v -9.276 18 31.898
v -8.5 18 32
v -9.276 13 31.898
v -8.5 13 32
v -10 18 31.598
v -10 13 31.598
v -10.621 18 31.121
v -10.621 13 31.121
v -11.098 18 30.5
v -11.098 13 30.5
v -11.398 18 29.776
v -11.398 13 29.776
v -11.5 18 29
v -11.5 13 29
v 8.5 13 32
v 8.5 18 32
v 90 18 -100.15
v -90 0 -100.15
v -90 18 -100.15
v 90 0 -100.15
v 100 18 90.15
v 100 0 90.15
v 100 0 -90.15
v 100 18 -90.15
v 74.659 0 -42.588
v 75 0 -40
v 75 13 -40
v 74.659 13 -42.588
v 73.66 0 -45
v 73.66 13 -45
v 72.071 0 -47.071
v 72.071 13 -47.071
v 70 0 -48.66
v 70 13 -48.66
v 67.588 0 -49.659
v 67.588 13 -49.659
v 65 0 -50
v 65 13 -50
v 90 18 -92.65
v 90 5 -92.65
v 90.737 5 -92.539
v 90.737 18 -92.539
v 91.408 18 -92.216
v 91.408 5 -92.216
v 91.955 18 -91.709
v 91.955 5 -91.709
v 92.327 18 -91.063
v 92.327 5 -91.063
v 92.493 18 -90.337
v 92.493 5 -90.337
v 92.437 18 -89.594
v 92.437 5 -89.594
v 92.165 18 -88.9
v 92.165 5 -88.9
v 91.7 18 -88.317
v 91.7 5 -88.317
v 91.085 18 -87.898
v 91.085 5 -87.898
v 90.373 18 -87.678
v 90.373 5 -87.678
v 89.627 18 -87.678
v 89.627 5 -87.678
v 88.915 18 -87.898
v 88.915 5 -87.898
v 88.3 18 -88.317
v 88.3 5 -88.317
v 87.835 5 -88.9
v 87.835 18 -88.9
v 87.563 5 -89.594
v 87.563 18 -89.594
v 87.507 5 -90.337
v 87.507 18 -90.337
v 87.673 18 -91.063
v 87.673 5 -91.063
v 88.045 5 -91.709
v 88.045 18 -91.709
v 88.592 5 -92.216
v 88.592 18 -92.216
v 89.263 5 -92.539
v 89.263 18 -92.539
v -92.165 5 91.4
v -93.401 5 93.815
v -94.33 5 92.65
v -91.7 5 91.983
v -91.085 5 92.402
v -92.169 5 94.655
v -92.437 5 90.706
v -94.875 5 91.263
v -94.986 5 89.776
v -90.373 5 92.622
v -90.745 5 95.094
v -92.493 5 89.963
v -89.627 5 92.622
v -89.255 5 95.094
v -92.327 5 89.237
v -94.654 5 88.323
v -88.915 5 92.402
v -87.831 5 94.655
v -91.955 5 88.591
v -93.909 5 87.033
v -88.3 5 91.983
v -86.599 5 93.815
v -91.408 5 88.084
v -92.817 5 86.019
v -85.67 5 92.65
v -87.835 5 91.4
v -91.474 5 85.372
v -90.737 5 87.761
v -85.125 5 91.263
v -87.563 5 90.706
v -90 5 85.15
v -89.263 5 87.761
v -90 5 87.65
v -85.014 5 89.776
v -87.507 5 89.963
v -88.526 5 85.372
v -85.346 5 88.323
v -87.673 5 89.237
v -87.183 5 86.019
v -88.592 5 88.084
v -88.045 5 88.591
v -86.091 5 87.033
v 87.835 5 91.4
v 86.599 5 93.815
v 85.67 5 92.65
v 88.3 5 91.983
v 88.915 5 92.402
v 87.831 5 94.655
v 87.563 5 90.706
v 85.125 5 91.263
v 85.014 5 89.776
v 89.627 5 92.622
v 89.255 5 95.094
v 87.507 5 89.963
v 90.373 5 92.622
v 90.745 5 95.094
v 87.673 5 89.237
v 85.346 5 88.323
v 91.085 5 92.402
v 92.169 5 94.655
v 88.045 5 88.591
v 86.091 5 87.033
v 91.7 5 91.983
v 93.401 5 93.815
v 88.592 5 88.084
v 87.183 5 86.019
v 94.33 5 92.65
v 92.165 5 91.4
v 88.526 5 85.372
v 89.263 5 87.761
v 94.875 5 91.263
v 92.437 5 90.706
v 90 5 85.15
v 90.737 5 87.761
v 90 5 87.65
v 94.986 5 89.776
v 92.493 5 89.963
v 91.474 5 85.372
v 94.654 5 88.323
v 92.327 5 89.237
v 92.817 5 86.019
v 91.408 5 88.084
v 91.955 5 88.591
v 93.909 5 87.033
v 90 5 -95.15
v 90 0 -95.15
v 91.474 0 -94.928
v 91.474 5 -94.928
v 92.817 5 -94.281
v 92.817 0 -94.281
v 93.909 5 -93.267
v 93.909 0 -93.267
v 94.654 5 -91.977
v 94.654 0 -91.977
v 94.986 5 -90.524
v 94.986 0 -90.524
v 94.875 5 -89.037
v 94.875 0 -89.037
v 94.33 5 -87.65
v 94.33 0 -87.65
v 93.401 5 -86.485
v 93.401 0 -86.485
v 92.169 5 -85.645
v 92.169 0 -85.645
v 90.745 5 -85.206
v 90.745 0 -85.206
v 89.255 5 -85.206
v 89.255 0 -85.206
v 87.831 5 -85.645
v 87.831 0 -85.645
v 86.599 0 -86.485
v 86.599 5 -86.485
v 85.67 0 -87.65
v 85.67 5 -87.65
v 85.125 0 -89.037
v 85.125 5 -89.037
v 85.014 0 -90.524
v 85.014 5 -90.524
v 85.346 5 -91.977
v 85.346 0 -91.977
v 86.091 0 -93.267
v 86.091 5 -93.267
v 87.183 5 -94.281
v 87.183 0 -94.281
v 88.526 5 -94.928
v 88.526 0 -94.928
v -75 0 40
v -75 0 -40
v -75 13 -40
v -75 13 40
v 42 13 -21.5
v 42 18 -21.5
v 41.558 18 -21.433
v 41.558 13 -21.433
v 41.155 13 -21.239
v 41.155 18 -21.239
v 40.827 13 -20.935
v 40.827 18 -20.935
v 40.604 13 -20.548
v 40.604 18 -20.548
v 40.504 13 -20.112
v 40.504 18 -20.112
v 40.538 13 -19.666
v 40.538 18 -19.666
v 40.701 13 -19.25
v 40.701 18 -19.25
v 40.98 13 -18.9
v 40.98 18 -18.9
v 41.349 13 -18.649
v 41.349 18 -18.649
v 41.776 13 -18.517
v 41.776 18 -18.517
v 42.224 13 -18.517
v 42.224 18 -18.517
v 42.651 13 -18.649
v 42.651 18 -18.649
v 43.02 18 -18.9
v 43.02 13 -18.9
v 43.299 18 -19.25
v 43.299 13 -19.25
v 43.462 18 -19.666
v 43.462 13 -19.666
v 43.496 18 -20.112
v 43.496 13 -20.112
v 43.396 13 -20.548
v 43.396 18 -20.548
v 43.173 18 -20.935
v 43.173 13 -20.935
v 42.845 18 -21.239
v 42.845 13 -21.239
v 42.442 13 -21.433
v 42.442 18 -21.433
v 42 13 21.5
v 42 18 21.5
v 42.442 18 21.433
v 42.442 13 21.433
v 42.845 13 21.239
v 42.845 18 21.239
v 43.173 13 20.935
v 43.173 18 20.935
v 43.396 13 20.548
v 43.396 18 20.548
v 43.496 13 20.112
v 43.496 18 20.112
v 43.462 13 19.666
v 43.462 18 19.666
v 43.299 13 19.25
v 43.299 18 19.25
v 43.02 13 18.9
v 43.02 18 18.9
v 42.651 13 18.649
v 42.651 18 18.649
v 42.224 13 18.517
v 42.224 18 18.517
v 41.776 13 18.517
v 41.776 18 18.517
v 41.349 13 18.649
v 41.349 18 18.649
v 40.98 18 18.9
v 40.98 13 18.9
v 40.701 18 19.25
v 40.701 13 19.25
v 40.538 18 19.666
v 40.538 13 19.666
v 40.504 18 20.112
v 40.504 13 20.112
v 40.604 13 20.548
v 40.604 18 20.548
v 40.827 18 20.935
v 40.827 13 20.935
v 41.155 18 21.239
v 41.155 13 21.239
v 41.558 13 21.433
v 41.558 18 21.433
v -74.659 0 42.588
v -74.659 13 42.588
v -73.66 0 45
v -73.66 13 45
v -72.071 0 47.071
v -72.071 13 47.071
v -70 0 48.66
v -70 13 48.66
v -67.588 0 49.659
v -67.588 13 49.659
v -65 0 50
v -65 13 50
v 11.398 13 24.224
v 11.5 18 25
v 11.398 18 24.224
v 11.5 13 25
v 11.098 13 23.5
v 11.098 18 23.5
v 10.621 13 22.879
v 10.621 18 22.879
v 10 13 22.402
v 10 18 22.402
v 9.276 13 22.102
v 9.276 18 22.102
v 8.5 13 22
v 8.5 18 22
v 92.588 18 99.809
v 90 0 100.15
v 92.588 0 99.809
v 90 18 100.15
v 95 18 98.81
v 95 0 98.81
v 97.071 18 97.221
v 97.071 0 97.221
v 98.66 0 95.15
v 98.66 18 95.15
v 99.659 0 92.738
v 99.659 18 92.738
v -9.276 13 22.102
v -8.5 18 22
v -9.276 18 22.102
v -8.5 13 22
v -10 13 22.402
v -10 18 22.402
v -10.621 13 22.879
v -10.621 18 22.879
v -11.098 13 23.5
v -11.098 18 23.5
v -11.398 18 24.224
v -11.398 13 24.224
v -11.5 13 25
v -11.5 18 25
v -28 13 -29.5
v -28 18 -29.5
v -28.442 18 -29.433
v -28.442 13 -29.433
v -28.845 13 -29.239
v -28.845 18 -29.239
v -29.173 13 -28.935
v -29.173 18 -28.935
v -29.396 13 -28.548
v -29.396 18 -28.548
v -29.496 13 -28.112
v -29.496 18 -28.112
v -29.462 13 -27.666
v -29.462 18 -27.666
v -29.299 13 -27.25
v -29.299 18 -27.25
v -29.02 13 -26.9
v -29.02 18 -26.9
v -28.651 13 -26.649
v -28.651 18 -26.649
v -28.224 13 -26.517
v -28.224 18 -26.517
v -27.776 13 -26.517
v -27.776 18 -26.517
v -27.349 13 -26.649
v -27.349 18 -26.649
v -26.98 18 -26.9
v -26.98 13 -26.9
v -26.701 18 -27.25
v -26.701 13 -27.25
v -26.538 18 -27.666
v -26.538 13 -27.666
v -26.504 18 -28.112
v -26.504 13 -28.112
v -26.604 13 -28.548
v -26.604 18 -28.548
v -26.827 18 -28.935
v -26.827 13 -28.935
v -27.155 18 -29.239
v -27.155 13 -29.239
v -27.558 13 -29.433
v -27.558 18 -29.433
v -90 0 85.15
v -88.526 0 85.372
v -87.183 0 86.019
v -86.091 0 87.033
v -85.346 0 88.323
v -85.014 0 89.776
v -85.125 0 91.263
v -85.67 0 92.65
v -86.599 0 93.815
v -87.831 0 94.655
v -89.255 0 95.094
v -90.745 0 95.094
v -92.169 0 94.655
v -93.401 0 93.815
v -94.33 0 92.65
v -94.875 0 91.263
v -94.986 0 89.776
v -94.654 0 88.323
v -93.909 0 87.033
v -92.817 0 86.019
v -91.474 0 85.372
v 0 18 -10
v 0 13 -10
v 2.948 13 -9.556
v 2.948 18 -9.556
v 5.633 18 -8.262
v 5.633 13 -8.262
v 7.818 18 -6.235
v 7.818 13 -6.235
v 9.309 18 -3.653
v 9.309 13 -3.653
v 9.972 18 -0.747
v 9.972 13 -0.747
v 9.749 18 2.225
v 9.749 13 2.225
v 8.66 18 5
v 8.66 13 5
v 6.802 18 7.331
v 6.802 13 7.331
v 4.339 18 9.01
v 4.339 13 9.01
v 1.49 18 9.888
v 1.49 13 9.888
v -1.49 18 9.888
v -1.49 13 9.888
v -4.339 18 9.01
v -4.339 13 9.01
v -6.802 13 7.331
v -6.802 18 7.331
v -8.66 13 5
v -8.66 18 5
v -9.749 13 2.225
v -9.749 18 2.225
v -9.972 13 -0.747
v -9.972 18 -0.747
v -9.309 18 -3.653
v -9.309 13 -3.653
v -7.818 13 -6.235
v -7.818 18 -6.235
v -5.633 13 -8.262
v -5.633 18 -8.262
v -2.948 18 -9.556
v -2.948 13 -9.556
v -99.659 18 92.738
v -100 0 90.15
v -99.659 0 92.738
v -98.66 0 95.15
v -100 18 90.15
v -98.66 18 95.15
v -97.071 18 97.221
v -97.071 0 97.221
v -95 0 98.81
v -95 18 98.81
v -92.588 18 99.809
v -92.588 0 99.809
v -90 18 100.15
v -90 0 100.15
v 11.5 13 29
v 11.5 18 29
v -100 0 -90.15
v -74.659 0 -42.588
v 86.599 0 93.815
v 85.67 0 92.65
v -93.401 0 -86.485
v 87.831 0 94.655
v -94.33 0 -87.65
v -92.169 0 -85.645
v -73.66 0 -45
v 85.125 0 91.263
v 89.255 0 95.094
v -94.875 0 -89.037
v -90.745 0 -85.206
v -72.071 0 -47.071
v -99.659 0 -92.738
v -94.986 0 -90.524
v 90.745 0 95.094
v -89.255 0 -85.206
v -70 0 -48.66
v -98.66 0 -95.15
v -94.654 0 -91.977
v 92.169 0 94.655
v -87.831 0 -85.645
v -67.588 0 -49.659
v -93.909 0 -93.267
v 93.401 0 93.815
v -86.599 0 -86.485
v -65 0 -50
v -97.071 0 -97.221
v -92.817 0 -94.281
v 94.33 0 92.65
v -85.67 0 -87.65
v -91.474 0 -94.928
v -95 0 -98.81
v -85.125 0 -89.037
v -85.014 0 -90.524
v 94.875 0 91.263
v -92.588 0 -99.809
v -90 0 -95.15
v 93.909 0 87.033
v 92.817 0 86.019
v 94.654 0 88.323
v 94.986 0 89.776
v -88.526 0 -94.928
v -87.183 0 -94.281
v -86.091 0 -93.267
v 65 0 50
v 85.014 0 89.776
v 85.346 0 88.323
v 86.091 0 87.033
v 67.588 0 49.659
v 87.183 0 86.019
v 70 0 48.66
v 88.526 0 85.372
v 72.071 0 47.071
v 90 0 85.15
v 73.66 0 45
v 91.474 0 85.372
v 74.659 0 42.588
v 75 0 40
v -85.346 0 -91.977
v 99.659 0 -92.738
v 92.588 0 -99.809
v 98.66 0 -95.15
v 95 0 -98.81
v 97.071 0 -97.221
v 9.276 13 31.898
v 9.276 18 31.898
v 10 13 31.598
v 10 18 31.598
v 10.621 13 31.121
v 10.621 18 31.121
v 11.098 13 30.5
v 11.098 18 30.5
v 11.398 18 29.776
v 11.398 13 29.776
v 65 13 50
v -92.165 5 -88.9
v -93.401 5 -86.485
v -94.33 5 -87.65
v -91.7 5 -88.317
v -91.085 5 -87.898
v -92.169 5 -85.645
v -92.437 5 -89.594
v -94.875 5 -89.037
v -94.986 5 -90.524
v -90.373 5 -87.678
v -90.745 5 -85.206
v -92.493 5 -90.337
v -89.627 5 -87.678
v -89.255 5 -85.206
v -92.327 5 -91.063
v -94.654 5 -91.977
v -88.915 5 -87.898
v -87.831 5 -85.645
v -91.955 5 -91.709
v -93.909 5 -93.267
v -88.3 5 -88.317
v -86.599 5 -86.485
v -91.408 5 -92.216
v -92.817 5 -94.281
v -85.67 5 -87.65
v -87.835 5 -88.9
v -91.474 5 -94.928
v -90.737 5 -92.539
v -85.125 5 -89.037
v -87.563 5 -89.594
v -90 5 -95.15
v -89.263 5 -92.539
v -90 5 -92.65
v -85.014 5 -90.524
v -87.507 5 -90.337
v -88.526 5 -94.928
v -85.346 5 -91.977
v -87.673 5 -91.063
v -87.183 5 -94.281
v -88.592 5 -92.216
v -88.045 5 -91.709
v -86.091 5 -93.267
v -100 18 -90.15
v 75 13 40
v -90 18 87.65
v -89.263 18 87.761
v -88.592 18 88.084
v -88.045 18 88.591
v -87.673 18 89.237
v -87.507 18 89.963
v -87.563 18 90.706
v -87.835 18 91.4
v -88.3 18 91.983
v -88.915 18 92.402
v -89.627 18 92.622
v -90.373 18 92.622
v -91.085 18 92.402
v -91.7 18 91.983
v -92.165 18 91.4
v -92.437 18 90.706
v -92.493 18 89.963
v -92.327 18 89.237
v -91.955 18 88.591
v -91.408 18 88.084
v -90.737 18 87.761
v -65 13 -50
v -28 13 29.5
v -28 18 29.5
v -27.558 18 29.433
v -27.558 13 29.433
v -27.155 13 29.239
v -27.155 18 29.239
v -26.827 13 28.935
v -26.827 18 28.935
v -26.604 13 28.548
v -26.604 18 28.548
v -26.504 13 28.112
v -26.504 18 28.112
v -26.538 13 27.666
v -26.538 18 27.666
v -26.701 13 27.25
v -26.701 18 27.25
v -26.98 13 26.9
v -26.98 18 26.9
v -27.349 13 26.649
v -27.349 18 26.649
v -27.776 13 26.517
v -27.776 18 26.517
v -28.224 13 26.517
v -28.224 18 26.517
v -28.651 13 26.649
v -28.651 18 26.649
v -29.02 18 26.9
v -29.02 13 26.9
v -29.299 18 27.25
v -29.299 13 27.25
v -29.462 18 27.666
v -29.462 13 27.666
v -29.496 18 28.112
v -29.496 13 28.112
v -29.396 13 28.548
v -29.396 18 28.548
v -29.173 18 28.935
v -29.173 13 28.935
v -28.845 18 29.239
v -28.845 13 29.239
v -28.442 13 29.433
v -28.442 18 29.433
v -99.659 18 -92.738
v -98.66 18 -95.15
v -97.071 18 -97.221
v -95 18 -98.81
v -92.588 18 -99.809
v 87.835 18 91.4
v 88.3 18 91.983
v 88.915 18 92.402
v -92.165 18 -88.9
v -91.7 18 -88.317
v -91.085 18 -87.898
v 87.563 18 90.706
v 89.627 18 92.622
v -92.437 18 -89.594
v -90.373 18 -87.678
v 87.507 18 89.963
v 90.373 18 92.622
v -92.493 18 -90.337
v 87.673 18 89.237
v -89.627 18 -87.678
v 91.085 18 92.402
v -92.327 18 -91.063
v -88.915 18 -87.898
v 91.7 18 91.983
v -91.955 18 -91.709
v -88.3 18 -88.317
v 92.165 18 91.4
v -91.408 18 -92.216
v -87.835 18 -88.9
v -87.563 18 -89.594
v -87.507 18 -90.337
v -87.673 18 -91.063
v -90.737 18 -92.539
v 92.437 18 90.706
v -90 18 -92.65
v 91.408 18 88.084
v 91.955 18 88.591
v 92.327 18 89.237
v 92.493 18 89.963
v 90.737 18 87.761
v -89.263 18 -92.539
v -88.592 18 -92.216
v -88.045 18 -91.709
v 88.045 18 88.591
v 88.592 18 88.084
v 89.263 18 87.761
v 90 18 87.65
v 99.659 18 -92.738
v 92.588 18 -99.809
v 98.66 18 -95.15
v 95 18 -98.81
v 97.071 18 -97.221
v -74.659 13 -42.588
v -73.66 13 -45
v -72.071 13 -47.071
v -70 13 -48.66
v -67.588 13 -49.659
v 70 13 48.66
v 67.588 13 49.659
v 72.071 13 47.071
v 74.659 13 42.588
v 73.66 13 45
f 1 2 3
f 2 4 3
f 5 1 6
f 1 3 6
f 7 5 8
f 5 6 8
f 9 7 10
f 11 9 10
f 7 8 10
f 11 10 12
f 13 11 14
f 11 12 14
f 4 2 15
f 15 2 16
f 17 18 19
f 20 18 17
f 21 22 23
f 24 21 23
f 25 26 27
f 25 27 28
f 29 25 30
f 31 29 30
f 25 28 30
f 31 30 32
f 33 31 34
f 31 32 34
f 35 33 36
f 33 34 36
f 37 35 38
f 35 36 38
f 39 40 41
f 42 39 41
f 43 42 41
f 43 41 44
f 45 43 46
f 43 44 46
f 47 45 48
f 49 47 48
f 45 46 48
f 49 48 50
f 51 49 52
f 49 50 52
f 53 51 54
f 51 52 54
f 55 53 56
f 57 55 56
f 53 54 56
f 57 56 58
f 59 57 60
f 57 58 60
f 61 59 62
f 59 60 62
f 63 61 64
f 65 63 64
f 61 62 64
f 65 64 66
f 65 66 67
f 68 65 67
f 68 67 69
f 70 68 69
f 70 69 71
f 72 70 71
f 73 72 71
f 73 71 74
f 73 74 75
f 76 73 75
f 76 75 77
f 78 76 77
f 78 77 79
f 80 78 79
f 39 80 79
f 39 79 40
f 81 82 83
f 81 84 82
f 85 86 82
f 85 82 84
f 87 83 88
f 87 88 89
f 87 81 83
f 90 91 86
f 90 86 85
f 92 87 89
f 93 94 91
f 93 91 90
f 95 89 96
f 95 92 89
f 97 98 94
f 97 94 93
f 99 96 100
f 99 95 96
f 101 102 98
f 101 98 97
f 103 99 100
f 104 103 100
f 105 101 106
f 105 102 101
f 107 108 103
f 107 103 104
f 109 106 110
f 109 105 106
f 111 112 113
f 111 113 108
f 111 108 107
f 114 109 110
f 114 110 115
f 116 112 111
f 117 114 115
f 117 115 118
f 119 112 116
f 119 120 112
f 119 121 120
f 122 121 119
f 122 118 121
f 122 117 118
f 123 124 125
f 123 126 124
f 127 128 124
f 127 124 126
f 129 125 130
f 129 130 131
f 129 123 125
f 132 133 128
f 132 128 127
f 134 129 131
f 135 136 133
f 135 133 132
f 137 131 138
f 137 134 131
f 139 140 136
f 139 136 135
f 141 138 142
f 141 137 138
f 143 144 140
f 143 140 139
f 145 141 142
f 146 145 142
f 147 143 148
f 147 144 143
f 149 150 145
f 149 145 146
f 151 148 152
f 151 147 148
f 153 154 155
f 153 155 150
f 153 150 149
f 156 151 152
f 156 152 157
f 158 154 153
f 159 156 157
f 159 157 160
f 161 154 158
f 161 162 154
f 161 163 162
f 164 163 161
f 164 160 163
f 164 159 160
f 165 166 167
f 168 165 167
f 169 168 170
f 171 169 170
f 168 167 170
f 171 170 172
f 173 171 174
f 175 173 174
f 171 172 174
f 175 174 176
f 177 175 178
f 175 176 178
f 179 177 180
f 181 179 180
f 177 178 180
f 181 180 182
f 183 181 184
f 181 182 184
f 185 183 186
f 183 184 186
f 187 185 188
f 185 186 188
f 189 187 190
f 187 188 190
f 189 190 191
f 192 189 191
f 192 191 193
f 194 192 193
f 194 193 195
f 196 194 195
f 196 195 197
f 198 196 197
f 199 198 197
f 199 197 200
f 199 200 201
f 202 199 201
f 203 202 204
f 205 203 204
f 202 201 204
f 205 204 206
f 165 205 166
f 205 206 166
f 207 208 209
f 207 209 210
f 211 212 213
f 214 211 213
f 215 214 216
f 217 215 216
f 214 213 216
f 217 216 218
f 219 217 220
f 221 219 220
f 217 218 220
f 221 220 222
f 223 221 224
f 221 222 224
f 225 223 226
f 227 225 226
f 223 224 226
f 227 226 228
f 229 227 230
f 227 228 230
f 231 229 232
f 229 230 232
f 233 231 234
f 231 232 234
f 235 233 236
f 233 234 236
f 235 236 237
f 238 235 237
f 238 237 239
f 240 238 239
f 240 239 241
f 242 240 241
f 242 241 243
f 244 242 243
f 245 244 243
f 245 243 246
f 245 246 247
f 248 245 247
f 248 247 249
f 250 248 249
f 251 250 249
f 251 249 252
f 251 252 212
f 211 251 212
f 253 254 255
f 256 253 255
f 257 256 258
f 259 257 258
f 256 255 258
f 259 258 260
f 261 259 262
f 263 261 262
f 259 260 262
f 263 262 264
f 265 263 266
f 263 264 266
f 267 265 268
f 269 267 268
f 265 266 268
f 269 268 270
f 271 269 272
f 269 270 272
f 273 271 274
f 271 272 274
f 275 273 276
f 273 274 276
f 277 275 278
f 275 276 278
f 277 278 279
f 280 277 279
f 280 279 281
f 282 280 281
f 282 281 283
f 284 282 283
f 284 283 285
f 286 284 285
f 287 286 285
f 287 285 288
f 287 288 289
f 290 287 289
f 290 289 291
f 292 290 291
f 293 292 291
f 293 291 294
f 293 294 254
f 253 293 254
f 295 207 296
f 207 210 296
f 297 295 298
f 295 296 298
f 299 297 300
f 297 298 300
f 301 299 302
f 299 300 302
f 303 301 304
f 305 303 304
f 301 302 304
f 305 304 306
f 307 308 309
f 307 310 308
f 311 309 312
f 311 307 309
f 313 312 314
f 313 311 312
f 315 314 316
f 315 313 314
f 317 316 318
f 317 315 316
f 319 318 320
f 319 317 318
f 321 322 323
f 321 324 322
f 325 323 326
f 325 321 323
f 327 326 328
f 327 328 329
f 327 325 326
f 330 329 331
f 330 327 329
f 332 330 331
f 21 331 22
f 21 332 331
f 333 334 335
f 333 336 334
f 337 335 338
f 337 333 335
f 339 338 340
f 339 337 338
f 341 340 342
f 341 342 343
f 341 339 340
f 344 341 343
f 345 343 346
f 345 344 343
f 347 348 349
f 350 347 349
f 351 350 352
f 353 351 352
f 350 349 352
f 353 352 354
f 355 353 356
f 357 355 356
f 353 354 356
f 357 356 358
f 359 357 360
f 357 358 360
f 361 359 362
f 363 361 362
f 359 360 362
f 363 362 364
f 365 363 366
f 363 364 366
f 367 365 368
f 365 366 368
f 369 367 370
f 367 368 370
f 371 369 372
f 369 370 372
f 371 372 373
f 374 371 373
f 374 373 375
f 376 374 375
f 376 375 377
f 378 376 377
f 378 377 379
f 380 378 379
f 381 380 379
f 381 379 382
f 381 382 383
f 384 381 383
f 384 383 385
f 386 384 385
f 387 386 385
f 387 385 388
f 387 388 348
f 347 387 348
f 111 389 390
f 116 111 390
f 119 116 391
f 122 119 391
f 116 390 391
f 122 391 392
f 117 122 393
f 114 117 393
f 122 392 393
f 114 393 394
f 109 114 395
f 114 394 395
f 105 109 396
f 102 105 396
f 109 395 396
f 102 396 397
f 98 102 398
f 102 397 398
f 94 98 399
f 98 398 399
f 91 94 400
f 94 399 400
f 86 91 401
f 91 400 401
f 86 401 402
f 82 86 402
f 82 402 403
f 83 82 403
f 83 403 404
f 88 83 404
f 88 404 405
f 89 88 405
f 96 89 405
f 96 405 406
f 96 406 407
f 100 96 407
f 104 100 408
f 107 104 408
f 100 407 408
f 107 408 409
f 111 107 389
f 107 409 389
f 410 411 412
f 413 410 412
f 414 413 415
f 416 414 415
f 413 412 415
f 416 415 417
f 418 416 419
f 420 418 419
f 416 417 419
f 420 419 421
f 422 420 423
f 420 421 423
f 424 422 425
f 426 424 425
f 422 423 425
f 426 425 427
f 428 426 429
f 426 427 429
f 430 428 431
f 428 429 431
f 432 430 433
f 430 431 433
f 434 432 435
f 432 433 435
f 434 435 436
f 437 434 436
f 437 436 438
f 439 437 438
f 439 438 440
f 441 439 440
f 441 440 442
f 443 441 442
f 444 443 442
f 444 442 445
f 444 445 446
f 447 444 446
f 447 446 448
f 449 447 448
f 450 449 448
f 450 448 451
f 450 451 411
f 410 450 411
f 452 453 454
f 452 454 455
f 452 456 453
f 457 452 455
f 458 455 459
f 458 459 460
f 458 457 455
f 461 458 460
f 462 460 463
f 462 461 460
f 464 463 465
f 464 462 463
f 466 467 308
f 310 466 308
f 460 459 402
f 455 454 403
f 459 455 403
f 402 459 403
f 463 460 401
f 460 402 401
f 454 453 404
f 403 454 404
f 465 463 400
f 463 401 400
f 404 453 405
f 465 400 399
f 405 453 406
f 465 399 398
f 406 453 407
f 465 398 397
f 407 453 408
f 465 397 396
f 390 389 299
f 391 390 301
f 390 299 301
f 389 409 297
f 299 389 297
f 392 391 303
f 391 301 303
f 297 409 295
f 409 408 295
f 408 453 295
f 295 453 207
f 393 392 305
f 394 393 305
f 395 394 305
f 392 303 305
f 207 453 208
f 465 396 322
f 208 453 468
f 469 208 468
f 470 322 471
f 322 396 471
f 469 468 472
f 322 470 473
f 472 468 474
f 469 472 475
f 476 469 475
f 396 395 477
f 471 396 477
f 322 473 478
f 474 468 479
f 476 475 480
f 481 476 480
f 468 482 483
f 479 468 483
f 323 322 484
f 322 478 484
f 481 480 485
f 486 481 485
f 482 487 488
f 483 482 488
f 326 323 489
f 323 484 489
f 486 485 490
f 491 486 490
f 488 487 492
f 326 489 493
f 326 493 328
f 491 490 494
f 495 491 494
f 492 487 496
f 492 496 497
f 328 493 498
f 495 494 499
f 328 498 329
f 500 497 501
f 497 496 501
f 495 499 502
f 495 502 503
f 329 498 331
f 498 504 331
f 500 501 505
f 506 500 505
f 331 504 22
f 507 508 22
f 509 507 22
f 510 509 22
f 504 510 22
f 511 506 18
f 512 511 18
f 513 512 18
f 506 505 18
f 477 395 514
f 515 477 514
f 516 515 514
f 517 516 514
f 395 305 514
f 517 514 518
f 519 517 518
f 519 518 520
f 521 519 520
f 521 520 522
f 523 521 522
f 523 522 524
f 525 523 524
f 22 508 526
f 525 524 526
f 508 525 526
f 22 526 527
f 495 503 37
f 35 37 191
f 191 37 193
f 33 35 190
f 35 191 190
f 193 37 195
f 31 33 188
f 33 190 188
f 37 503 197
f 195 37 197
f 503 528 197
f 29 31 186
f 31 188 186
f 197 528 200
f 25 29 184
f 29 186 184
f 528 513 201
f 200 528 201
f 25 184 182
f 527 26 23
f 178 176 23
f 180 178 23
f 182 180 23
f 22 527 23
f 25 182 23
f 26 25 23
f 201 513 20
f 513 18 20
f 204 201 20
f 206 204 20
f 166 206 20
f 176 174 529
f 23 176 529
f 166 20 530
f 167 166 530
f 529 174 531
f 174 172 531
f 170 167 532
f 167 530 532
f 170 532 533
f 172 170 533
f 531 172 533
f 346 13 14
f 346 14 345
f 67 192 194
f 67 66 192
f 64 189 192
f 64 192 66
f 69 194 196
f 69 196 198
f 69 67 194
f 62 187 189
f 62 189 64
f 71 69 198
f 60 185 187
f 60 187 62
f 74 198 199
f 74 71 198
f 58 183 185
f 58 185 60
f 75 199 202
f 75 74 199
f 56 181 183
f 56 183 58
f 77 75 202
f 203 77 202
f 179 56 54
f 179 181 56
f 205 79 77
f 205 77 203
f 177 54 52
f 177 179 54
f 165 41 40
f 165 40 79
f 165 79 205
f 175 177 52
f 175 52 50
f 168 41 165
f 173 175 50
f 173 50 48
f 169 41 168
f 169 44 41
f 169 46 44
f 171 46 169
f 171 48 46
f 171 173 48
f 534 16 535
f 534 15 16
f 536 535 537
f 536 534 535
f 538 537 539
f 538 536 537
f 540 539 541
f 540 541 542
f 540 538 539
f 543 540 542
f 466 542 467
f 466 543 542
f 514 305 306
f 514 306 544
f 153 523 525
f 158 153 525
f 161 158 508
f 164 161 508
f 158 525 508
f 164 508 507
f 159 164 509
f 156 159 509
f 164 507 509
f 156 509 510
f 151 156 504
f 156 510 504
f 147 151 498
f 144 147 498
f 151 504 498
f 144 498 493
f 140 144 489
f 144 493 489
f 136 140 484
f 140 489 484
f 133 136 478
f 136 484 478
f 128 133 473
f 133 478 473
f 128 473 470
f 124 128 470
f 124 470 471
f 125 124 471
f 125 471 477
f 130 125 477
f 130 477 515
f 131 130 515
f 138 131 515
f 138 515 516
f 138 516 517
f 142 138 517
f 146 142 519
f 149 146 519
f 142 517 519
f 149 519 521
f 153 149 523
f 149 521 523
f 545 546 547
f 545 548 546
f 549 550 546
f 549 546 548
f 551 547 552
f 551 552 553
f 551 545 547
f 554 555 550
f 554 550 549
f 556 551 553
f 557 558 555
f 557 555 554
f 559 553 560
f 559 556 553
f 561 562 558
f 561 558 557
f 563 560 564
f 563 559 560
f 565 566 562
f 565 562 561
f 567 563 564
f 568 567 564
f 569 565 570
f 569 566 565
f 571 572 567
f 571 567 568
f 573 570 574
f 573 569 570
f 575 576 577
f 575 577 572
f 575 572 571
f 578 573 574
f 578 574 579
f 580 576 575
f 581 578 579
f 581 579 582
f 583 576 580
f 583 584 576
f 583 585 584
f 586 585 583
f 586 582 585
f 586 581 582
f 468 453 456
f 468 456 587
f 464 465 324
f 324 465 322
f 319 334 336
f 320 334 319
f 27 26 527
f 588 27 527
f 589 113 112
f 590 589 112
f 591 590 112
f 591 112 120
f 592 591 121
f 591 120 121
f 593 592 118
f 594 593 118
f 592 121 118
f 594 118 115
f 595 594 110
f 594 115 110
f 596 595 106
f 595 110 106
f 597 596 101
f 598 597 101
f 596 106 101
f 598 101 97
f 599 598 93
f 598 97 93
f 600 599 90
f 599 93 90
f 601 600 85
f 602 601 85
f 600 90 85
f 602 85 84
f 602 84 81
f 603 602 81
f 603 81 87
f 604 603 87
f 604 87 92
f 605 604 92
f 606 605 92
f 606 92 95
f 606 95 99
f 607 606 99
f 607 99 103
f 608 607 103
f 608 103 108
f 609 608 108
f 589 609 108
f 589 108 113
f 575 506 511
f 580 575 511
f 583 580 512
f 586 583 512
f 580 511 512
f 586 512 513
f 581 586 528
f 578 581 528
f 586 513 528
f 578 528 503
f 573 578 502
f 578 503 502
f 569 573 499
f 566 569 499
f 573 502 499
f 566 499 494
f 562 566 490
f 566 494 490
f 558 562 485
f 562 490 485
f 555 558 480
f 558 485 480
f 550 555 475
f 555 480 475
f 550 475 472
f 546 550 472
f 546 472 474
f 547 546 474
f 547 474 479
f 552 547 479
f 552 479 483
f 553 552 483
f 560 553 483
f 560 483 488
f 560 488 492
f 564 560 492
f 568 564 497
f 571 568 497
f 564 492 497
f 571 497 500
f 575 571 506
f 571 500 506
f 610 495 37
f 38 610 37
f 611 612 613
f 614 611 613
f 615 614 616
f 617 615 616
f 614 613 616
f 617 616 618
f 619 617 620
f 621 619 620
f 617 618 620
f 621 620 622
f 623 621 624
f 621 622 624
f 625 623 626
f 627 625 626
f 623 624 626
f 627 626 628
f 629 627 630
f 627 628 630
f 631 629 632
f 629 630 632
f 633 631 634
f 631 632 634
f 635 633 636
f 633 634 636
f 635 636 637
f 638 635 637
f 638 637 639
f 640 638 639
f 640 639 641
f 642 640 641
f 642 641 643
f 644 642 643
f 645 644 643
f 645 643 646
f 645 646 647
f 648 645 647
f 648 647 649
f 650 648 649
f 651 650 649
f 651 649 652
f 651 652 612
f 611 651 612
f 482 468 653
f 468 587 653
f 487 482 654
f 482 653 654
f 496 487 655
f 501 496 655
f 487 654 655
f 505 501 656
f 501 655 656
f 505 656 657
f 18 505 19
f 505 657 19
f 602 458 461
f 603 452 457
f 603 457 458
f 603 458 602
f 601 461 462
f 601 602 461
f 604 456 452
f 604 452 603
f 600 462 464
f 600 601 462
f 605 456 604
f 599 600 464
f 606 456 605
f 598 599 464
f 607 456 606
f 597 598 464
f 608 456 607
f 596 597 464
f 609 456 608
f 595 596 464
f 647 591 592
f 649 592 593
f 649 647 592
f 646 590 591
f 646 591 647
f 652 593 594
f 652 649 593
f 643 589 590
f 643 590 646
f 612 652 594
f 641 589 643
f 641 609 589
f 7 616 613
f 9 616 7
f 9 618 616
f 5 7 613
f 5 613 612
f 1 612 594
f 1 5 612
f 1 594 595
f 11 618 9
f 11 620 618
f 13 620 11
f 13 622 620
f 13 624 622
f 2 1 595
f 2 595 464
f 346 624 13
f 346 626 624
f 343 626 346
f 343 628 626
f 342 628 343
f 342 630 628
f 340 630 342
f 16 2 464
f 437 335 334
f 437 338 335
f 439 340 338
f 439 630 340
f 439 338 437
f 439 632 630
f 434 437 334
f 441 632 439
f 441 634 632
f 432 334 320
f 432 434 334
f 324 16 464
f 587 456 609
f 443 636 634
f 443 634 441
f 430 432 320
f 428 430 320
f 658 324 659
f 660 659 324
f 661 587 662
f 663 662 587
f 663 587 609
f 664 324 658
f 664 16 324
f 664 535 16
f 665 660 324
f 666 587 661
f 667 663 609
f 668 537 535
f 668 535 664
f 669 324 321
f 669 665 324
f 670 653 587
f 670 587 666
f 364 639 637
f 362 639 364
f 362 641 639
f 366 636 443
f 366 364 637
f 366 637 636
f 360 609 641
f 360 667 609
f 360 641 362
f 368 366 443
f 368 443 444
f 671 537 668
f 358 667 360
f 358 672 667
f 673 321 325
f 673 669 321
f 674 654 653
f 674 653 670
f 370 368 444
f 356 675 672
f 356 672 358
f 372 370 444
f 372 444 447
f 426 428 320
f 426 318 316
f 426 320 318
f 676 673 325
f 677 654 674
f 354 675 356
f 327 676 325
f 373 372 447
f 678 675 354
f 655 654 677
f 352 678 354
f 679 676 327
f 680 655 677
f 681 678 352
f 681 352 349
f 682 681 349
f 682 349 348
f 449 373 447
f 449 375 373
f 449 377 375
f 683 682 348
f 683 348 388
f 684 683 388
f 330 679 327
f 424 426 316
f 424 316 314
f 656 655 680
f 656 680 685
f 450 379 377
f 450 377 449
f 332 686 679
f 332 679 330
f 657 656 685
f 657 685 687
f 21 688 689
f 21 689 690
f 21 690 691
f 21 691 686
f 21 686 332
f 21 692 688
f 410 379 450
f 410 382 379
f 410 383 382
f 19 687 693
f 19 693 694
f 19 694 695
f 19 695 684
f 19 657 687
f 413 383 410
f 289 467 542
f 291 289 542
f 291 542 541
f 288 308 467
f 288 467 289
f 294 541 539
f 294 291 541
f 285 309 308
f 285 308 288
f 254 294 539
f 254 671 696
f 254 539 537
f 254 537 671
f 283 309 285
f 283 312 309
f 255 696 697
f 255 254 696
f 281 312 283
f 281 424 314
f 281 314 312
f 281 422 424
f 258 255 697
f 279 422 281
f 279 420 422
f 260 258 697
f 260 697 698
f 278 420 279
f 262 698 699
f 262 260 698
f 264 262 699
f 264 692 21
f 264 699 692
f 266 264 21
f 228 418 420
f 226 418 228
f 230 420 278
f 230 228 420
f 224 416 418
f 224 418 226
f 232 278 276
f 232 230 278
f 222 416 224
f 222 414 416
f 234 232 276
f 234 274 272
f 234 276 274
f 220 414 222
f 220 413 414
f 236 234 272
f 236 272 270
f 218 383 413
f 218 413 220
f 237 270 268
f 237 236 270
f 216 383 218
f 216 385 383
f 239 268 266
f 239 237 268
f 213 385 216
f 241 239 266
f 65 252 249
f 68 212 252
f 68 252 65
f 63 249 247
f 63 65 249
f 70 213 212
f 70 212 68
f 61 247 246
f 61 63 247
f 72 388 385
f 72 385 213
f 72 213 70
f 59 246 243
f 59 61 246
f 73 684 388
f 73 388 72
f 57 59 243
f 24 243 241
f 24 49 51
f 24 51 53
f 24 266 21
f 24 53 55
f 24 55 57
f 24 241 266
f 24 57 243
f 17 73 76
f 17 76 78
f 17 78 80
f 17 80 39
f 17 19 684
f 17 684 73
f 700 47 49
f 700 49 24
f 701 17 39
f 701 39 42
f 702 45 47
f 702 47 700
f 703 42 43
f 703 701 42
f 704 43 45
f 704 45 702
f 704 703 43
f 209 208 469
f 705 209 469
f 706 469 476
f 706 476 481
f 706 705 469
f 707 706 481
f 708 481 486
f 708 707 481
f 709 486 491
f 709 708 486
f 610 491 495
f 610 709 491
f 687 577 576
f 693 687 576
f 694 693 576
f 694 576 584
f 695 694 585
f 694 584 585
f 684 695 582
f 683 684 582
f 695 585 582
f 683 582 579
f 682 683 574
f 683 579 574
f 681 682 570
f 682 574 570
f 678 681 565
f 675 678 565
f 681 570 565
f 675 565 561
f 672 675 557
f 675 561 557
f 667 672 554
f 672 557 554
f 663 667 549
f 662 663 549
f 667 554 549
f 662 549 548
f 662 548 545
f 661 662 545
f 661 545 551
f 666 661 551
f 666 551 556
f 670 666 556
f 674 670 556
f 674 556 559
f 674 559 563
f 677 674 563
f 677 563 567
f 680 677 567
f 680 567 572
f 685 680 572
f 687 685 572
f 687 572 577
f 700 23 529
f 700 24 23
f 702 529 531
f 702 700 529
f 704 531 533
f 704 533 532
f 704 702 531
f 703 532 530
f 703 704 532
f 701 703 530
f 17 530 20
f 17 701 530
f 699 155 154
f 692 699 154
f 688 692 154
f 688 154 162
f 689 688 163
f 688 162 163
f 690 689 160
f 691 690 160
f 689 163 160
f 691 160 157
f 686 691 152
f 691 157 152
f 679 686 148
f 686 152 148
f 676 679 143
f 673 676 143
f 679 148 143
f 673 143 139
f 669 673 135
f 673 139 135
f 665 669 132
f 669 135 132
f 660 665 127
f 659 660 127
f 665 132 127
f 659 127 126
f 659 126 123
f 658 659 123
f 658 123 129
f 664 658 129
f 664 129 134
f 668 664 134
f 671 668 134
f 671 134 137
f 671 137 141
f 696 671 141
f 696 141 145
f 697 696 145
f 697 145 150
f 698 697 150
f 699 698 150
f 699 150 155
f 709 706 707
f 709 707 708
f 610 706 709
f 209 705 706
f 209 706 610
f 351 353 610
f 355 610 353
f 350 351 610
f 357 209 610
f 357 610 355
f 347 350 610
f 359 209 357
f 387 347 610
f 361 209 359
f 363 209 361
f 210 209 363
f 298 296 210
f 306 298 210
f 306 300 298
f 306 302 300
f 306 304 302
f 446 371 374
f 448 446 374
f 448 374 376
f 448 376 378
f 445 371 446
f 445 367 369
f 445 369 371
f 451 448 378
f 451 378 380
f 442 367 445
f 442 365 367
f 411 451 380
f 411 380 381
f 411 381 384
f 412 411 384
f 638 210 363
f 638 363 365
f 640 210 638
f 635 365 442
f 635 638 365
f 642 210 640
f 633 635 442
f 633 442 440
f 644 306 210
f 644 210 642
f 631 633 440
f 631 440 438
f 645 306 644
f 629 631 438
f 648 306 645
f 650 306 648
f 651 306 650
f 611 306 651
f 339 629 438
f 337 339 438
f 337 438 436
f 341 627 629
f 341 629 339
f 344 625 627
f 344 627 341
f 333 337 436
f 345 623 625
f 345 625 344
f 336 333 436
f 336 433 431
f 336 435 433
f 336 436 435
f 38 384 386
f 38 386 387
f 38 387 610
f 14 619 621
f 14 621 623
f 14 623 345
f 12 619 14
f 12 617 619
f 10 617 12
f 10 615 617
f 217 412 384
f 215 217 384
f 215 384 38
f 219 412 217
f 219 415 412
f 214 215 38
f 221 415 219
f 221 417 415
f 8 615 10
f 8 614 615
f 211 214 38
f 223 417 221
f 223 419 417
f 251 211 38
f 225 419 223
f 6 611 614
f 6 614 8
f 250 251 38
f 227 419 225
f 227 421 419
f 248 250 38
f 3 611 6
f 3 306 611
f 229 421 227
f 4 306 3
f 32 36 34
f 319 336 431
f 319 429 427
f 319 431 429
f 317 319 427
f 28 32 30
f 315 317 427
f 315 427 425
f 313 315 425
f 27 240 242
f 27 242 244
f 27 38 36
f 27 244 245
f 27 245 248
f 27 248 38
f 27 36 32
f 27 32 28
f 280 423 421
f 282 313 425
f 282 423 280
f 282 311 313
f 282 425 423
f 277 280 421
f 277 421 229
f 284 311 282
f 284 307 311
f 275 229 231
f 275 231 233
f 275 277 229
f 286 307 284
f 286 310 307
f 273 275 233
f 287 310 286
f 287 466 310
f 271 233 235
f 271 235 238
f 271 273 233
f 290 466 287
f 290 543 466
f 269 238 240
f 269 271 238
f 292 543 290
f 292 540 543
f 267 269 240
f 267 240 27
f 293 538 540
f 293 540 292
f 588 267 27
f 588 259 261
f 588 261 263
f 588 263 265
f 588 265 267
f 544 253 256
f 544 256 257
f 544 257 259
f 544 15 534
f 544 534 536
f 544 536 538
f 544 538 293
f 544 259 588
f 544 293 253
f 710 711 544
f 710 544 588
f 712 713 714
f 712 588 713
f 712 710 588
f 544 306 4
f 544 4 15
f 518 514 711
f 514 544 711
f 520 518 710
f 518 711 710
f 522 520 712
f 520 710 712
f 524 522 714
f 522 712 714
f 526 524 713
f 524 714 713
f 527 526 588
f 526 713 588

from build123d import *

# Parameters (mm, degrees)
SKETCH1_W           = 200
SKETCH1_H           = 200.3
BOSS_EXTRUDE1_DEPTH = 18
FILLET1_R           = 10
SKETCH2_W           = 150
SKETCH2_H           = 100
CUT_EXTRUDE1_DEPTH  = 13
FILLET2_R           = 10
SKETCH3_R           = 5
CUT_EXTRUDE2_DEPTH  = 5
SKETCH4_R           = 2.5
CUT_EXTRUDE3_DEPTH  = 143.123265161
SKETCH5_R           = 10
CUT_EXTRUDE4_DEPTH  = 143.123265161
SKETCH6_R           = 1.5
SKETCH6_W           = 23
SKETCH6_H           = 10
CUT_EXTRUDE5_DEPTH  = 143.667524335
FILLET3_R           = 3


with BuildPart() as part:
    # Sketch1 → Boss-Extrude1 (new body)
    with BuildSketch(Plane(origin=(0, 0, 0), x_dir=(1, 0, 0), z_dir=(0, 1, 0))):
        Rectangle(SKETCH1_W, SKETCH1_H)
    extrude(amount=BOSS_EXTRUDE1_DEPTH)

    # Fillet1
    fillet1_edges = [part.edges().sort_by_distance(p)[0] for p in [
        (100, 9, 100.15),
        (-100, 9, 100.15),
        (-100, 9, -100.15),
        (100, 9, -100.15),
    ]]
    fillet(fillet1_edges, radius=FILLET1_R)

    # Sketch2 → Cut-Extrude1 (cut)
    with BuildSketch(Plane.XZ):
        Rectangle(SKETCH2_W, SKETCH2_H)
    extrude(amount=-CUT_EXTRUDE1_DEPTH, mode=Mode.SUBTRACT)

    # Fillet2
    fillet2_edges = [part.edges().sort_by_distance(p)[0] for p in [
        (75, 6.5, 50),
        (75, 6.5, -50),
        (-75, 6.5, -50),
        (-75, 6.5, 50),
    ]]
    fillet(fillet2_edges, radius=FILLET2_R)

    # Sketch3 → Cut-Extrude2 (cut)
    with BuildSketch(Plane.XZ):
        with Locations(Location((-90, 90.15, 0), (0, 0, 270))):
            Circle(SKETCH3_R)
        with Locations(Location((90, 90.15, 0), (0, 0, 270))):
            Circle(SKETCH3_R)
        with Locations(Location((90, -90.15, 0), (0, 0, 270))):
            Circle(SKETCH3_R)
        with Locations(Location((-90, -90.15, 0), (0, 0, 270))):
            Circle(SKETCH3_R)
    extrude(amount=-CUT_EXTRUDE2_DEPTH, mode=Mode.SUBTRACT)

    # Sketch4 → Cut-Extrude3 (cut, through all)
    with BuildSketch(Plane.XZ.offset(-5)):
        with Locations(Location((-90, 90.15, 0), (0, 0, 270))):
            Circle(SKETCH4_R)
        with Locations(Location((90, 90.15, 0), (0, 0, 270))):
            Circle(SKETCH4_R)
        with Locations(Location((90, -90.15, 0), (0, 0, 270))):
            Circle(SKETCH4_R)
        with Locations(Location((-90, -90.15, 0), (0, 0, 270))):
            Circle(SKETCH4_R)
    extrude(amount=-CUT_EXTRUDE3_DEPTH, mode=Mode.SUBTRACT)

    # Sketch5 → Cut-Extrude4 (cut, through all)
    with BuildSketch(Plane.XZ.offset(-13)):
        with Locations(Location((0, 0, 0), (0, 0, 270))):
            Circle(SKETCH5_R)
    extrude(amount=-CUT_EXTRUDE4_DEPTH, mode=Mode.SUBTRACT)

    # Sketch6 → Cut-Extrude5 (cut, through all)
    with BuildSketch(Plane(origin=(0, 18, 0), x_dir=(1, 0, 0), z_dir=(0, 1, 0))):
        with Locations(Location((-28, -28, 0), (0, 0, 270))):
            Circle(SKETCH6_R)
        with Locations(Location((42, -20, 0), (0, 0, 270))):
            Circle(SKETCH6_R)
        with Locations(Location((-28, 28, 0), (0, 0, 90))):
            Circle(SKETCH6_R)
        with Locations(Location((42, 20, 0), (0, 0, 90))):
            Circle(SKETCH6_R)
        with Locations((0, -27)):
            Rectangle(SKETCH6_W, SKETCH6_H)
    extrude(amount=-CUT_EXTRUDE5_DEPTH, mode=Mode.SUBTRACT)

    # Fillet3
    fillet3_edges = [part.edges().sort_by_distance(p)[0] for p in [
        (11.5, 15.5, 22),
        (11.5, 15.5, 32),
        (-11.5, 15.5, 32),
        (-11.5, 15.5, 22),
    ]]
    fillet(fillet3_edges, radius=FILLET3_R)


solid = part.part
